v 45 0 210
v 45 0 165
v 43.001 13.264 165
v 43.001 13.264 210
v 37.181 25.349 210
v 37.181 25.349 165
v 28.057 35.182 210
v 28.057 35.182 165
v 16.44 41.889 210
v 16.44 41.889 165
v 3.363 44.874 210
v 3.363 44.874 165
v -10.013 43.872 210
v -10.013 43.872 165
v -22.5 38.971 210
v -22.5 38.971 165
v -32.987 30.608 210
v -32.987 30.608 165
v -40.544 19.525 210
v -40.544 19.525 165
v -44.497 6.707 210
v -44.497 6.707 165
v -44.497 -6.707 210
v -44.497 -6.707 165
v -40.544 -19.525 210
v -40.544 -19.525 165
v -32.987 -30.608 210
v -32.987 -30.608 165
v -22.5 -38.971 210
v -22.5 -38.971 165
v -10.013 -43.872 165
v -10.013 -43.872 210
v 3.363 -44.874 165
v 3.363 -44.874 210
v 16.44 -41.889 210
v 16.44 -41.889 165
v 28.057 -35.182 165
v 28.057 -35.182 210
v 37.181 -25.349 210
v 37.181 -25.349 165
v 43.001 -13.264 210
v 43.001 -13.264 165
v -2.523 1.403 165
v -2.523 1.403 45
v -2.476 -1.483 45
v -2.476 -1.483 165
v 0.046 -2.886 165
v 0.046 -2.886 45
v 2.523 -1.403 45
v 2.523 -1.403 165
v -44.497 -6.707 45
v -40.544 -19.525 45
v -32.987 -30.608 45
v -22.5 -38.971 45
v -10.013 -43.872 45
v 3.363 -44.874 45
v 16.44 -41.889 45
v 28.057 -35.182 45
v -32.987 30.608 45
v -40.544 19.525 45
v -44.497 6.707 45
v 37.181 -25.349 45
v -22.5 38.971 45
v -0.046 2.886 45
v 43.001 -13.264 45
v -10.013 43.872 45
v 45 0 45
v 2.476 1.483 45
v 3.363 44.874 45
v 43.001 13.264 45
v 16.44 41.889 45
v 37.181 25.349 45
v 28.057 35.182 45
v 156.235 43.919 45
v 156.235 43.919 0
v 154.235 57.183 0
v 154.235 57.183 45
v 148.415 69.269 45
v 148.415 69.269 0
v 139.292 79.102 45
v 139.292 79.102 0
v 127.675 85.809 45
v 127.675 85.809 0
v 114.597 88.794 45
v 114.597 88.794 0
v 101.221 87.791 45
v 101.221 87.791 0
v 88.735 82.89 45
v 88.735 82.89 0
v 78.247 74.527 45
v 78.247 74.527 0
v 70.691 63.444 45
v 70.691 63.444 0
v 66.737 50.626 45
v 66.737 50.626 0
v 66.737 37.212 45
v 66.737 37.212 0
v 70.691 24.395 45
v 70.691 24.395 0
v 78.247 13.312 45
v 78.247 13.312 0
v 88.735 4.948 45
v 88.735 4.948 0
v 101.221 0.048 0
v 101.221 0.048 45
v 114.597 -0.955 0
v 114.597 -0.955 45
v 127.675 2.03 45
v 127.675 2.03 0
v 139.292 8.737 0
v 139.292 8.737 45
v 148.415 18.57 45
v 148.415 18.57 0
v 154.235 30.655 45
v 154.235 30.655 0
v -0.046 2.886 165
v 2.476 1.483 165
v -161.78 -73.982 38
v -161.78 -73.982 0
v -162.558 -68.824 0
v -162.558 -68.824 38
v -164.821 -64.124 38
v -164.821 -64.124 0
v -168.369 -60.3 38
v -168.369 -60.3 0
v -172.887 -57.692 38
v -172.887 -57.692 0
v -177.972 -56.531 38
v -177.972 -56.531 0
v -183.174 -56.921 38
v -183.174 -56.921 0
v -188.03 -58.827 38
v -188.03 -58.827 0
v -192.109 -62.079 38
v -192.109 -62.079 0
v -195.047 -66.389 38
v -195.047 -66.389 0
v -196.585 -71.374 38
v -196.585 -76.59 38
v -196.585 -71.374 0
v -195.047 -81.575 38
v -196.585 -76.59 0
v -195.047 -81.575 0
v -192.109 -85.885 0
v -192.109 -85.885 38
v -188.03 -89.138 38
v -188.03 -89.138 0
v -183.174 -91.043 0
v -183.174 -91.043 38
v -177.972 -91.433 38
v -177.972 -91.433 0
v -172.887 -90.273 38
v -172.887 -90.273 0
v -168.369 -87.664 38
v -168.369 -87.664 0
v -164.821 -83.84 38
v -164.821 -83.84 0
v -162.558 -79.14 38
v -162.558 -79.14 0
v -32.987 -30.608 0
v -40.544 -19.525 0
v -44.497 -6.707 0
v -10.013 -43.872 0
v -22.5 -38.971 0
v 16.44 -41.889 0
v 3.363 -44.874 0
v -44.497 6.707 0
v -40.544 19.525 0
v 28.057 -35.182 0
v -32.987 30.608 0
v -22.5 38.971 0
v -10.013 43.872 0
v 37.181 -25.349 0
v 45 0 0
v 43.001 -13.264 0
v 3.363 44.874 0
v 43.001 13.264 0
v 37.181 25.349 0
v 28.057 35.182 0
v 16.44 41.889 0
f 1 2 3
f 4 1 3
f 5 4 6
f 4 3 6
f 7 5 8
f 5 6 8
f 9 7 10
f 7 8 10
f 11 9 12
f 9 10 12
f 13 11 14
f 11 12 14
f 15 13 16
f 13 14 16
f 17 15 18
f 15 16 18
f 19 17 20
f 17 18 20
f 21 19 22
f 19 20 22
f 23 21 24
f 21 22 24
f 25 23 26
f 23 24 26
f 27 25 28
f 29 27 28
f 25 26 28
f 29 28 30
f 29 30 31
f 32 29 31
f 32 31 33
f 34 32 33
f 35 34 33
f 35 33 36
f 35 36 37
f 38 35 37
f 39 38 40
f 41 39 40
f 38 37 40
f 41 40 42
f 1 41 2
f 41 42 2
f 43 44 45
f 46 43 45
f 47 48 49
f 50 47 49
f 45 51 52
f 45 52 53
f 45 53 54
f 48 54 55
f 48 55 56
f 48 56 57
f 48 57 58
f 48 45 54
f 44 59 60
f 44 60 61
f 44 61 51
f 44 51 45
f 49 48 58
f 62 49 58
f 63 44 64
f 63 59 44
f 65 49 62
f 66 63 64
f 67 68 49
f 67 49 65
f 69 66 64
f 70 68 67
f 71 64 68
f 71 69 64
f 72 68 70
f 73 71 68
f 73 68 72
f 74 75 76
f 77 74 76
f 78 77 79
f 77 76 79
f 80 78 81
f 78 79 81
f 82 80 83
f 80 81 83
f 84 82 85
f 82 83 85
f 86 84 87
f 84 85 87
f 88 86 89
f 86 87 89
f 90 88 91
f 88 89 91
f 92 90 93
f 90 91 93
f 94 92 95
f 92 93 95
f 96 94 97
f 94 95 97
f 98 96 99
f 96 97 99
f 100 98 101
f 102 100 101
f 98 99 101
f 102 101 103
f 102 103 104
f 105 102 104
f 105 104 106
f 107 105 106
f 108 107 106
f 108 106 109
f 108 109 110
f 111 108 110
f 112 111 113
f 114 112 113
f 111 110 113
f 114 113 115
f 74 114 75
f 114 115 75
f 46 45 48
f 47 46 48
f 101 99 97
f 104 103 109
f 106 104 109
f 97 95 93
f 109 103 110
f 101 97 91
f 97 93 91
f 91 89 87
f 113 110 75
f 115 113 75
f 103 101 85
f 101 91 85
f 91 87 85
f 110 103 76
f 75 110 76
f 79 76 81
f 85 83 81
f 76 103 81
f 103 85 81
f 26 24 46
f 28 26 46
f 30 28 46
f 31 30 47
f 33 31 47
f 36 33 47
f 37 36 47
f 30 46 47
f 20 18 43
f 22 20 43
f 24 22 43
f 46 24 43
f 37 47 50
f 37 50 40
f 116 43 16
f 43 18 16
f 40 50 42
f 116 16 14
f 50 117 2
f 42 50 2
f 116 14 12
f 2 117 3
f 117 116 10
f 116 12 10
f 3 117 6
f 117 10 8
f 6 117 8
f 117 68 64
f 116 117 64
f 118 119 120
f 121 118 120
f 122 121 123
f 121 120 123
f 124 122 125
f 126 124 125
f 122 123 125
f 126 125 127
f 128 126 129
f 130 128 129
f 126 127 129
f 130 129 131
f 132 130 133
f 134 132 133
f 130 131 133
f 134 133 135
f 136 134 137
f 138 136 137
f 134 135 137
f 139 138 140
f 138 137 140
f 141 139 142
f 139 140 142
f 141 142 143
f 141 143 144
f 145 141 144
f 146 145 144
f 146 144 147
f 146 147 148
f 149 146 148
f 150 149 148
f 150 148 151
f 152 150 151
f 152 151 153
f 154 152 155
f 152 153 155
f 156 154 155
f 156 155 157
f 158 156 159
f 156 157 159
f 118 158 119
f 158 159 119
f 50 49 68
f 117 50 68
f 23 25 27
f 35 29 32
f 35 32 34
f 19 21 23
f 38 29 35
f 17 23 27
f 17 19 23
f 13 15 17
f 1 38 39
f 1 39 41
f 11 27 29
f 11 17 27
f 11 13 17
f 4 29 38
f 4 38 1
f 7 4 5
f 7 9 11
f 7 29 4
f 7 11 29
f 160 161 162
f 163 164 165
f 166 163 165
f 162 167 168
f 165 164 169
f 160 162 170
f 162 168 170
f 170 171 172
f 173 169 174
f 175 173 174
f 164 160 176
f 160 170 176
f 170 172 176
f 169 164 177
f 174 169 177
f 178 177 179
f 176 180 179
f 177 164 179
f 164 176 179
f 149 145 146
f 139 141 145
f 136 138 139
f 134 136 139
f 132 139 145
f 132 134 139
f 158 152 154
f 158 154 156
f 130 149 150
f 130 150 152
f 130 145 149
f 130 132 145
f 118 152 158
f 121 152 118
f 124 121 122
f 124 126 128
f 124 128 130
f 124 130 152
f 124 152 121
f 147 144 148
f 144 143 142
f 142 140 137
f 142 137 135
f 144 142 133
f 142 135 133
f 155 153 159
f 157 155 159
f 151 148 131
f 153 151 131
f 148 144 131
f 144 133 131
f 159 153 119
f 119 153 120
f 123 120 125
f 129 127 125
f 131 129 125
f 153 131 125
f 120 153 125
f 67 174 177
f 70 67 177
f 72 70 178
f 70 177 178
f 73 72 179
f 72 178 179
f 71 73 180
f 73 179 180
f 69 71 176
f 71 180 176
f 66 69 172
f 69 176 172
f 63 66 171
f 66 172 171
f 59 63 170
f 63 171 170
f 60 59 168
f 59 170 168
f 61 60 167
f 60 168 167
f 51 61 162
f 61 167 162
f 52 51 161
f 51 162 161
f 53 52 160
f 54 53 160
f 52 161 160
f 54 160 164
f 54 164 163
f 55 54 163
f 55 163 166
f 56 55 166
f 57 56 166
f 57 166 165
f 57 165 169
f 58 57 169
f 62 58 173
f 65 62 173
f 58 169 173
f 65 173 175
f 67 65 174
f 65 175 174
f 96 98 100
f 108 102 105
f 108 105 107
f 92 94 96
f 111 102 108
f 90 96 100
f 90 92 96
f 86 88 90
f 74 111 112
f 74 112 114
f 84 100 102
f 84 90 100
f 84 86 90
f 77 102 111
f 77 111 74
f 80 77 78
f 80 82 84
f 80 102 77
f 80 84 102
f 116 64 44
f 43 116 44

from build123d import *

# Parameters (mm, degrees)
F0_R     = 45
F1_DEPTH = 45
F3_DEPTH = 120
F4_R     = 45
F5_DEPTH = 45
F6_R     = 45
F7_DEPTH = 45
F8_R     = 17.5
F9_DEPTH = 38


with BuildPart() as f1:
    # F0 (on Top) → F1 (new body)
    with BuildSketch(Plane.XY):
        Circle(F0_R)
    extrude(amount=F1_DEPTH)

    # F2 (on face) → F3 (join)
    with BuildSketch(Plane.XY.offset(45)):
        Polygon((2.476471, 1.483383), (-0.046412, 2.886378), (-2.522883, 1.402995), (-2.476471, -1.483383), (0.046412, -2.886378), (2.522883, -1.402995), align=None)
    extrude(amount=F3_DEPTH)

    # F4 (on face) → F5 (join)
    with BuildSketch(Plane.XY.offset(165)):
        Circle(F4_R)
    extrude(amount=F5_DEPTH)


with BuildPart() as f7:
    # F6 (on Top) → F7 (new body)
    with BuildSketch(Plane.XY):
        with Locations((111.234508, 43.919344)):
            Circle(F6_R)
    extrude(amount=F7_DEPTH)


with BuildPart() as f9:
    # F8 (on Top) → F9 (new body)
    with BuildSketch(Plane.XY):
        with Locations((-179.280102, -73.982216)):
            Circle(F8_R)
    extrude(amount=F9_DEPTH)


solid = Compound([f1.part, f7.part, f9.part])
